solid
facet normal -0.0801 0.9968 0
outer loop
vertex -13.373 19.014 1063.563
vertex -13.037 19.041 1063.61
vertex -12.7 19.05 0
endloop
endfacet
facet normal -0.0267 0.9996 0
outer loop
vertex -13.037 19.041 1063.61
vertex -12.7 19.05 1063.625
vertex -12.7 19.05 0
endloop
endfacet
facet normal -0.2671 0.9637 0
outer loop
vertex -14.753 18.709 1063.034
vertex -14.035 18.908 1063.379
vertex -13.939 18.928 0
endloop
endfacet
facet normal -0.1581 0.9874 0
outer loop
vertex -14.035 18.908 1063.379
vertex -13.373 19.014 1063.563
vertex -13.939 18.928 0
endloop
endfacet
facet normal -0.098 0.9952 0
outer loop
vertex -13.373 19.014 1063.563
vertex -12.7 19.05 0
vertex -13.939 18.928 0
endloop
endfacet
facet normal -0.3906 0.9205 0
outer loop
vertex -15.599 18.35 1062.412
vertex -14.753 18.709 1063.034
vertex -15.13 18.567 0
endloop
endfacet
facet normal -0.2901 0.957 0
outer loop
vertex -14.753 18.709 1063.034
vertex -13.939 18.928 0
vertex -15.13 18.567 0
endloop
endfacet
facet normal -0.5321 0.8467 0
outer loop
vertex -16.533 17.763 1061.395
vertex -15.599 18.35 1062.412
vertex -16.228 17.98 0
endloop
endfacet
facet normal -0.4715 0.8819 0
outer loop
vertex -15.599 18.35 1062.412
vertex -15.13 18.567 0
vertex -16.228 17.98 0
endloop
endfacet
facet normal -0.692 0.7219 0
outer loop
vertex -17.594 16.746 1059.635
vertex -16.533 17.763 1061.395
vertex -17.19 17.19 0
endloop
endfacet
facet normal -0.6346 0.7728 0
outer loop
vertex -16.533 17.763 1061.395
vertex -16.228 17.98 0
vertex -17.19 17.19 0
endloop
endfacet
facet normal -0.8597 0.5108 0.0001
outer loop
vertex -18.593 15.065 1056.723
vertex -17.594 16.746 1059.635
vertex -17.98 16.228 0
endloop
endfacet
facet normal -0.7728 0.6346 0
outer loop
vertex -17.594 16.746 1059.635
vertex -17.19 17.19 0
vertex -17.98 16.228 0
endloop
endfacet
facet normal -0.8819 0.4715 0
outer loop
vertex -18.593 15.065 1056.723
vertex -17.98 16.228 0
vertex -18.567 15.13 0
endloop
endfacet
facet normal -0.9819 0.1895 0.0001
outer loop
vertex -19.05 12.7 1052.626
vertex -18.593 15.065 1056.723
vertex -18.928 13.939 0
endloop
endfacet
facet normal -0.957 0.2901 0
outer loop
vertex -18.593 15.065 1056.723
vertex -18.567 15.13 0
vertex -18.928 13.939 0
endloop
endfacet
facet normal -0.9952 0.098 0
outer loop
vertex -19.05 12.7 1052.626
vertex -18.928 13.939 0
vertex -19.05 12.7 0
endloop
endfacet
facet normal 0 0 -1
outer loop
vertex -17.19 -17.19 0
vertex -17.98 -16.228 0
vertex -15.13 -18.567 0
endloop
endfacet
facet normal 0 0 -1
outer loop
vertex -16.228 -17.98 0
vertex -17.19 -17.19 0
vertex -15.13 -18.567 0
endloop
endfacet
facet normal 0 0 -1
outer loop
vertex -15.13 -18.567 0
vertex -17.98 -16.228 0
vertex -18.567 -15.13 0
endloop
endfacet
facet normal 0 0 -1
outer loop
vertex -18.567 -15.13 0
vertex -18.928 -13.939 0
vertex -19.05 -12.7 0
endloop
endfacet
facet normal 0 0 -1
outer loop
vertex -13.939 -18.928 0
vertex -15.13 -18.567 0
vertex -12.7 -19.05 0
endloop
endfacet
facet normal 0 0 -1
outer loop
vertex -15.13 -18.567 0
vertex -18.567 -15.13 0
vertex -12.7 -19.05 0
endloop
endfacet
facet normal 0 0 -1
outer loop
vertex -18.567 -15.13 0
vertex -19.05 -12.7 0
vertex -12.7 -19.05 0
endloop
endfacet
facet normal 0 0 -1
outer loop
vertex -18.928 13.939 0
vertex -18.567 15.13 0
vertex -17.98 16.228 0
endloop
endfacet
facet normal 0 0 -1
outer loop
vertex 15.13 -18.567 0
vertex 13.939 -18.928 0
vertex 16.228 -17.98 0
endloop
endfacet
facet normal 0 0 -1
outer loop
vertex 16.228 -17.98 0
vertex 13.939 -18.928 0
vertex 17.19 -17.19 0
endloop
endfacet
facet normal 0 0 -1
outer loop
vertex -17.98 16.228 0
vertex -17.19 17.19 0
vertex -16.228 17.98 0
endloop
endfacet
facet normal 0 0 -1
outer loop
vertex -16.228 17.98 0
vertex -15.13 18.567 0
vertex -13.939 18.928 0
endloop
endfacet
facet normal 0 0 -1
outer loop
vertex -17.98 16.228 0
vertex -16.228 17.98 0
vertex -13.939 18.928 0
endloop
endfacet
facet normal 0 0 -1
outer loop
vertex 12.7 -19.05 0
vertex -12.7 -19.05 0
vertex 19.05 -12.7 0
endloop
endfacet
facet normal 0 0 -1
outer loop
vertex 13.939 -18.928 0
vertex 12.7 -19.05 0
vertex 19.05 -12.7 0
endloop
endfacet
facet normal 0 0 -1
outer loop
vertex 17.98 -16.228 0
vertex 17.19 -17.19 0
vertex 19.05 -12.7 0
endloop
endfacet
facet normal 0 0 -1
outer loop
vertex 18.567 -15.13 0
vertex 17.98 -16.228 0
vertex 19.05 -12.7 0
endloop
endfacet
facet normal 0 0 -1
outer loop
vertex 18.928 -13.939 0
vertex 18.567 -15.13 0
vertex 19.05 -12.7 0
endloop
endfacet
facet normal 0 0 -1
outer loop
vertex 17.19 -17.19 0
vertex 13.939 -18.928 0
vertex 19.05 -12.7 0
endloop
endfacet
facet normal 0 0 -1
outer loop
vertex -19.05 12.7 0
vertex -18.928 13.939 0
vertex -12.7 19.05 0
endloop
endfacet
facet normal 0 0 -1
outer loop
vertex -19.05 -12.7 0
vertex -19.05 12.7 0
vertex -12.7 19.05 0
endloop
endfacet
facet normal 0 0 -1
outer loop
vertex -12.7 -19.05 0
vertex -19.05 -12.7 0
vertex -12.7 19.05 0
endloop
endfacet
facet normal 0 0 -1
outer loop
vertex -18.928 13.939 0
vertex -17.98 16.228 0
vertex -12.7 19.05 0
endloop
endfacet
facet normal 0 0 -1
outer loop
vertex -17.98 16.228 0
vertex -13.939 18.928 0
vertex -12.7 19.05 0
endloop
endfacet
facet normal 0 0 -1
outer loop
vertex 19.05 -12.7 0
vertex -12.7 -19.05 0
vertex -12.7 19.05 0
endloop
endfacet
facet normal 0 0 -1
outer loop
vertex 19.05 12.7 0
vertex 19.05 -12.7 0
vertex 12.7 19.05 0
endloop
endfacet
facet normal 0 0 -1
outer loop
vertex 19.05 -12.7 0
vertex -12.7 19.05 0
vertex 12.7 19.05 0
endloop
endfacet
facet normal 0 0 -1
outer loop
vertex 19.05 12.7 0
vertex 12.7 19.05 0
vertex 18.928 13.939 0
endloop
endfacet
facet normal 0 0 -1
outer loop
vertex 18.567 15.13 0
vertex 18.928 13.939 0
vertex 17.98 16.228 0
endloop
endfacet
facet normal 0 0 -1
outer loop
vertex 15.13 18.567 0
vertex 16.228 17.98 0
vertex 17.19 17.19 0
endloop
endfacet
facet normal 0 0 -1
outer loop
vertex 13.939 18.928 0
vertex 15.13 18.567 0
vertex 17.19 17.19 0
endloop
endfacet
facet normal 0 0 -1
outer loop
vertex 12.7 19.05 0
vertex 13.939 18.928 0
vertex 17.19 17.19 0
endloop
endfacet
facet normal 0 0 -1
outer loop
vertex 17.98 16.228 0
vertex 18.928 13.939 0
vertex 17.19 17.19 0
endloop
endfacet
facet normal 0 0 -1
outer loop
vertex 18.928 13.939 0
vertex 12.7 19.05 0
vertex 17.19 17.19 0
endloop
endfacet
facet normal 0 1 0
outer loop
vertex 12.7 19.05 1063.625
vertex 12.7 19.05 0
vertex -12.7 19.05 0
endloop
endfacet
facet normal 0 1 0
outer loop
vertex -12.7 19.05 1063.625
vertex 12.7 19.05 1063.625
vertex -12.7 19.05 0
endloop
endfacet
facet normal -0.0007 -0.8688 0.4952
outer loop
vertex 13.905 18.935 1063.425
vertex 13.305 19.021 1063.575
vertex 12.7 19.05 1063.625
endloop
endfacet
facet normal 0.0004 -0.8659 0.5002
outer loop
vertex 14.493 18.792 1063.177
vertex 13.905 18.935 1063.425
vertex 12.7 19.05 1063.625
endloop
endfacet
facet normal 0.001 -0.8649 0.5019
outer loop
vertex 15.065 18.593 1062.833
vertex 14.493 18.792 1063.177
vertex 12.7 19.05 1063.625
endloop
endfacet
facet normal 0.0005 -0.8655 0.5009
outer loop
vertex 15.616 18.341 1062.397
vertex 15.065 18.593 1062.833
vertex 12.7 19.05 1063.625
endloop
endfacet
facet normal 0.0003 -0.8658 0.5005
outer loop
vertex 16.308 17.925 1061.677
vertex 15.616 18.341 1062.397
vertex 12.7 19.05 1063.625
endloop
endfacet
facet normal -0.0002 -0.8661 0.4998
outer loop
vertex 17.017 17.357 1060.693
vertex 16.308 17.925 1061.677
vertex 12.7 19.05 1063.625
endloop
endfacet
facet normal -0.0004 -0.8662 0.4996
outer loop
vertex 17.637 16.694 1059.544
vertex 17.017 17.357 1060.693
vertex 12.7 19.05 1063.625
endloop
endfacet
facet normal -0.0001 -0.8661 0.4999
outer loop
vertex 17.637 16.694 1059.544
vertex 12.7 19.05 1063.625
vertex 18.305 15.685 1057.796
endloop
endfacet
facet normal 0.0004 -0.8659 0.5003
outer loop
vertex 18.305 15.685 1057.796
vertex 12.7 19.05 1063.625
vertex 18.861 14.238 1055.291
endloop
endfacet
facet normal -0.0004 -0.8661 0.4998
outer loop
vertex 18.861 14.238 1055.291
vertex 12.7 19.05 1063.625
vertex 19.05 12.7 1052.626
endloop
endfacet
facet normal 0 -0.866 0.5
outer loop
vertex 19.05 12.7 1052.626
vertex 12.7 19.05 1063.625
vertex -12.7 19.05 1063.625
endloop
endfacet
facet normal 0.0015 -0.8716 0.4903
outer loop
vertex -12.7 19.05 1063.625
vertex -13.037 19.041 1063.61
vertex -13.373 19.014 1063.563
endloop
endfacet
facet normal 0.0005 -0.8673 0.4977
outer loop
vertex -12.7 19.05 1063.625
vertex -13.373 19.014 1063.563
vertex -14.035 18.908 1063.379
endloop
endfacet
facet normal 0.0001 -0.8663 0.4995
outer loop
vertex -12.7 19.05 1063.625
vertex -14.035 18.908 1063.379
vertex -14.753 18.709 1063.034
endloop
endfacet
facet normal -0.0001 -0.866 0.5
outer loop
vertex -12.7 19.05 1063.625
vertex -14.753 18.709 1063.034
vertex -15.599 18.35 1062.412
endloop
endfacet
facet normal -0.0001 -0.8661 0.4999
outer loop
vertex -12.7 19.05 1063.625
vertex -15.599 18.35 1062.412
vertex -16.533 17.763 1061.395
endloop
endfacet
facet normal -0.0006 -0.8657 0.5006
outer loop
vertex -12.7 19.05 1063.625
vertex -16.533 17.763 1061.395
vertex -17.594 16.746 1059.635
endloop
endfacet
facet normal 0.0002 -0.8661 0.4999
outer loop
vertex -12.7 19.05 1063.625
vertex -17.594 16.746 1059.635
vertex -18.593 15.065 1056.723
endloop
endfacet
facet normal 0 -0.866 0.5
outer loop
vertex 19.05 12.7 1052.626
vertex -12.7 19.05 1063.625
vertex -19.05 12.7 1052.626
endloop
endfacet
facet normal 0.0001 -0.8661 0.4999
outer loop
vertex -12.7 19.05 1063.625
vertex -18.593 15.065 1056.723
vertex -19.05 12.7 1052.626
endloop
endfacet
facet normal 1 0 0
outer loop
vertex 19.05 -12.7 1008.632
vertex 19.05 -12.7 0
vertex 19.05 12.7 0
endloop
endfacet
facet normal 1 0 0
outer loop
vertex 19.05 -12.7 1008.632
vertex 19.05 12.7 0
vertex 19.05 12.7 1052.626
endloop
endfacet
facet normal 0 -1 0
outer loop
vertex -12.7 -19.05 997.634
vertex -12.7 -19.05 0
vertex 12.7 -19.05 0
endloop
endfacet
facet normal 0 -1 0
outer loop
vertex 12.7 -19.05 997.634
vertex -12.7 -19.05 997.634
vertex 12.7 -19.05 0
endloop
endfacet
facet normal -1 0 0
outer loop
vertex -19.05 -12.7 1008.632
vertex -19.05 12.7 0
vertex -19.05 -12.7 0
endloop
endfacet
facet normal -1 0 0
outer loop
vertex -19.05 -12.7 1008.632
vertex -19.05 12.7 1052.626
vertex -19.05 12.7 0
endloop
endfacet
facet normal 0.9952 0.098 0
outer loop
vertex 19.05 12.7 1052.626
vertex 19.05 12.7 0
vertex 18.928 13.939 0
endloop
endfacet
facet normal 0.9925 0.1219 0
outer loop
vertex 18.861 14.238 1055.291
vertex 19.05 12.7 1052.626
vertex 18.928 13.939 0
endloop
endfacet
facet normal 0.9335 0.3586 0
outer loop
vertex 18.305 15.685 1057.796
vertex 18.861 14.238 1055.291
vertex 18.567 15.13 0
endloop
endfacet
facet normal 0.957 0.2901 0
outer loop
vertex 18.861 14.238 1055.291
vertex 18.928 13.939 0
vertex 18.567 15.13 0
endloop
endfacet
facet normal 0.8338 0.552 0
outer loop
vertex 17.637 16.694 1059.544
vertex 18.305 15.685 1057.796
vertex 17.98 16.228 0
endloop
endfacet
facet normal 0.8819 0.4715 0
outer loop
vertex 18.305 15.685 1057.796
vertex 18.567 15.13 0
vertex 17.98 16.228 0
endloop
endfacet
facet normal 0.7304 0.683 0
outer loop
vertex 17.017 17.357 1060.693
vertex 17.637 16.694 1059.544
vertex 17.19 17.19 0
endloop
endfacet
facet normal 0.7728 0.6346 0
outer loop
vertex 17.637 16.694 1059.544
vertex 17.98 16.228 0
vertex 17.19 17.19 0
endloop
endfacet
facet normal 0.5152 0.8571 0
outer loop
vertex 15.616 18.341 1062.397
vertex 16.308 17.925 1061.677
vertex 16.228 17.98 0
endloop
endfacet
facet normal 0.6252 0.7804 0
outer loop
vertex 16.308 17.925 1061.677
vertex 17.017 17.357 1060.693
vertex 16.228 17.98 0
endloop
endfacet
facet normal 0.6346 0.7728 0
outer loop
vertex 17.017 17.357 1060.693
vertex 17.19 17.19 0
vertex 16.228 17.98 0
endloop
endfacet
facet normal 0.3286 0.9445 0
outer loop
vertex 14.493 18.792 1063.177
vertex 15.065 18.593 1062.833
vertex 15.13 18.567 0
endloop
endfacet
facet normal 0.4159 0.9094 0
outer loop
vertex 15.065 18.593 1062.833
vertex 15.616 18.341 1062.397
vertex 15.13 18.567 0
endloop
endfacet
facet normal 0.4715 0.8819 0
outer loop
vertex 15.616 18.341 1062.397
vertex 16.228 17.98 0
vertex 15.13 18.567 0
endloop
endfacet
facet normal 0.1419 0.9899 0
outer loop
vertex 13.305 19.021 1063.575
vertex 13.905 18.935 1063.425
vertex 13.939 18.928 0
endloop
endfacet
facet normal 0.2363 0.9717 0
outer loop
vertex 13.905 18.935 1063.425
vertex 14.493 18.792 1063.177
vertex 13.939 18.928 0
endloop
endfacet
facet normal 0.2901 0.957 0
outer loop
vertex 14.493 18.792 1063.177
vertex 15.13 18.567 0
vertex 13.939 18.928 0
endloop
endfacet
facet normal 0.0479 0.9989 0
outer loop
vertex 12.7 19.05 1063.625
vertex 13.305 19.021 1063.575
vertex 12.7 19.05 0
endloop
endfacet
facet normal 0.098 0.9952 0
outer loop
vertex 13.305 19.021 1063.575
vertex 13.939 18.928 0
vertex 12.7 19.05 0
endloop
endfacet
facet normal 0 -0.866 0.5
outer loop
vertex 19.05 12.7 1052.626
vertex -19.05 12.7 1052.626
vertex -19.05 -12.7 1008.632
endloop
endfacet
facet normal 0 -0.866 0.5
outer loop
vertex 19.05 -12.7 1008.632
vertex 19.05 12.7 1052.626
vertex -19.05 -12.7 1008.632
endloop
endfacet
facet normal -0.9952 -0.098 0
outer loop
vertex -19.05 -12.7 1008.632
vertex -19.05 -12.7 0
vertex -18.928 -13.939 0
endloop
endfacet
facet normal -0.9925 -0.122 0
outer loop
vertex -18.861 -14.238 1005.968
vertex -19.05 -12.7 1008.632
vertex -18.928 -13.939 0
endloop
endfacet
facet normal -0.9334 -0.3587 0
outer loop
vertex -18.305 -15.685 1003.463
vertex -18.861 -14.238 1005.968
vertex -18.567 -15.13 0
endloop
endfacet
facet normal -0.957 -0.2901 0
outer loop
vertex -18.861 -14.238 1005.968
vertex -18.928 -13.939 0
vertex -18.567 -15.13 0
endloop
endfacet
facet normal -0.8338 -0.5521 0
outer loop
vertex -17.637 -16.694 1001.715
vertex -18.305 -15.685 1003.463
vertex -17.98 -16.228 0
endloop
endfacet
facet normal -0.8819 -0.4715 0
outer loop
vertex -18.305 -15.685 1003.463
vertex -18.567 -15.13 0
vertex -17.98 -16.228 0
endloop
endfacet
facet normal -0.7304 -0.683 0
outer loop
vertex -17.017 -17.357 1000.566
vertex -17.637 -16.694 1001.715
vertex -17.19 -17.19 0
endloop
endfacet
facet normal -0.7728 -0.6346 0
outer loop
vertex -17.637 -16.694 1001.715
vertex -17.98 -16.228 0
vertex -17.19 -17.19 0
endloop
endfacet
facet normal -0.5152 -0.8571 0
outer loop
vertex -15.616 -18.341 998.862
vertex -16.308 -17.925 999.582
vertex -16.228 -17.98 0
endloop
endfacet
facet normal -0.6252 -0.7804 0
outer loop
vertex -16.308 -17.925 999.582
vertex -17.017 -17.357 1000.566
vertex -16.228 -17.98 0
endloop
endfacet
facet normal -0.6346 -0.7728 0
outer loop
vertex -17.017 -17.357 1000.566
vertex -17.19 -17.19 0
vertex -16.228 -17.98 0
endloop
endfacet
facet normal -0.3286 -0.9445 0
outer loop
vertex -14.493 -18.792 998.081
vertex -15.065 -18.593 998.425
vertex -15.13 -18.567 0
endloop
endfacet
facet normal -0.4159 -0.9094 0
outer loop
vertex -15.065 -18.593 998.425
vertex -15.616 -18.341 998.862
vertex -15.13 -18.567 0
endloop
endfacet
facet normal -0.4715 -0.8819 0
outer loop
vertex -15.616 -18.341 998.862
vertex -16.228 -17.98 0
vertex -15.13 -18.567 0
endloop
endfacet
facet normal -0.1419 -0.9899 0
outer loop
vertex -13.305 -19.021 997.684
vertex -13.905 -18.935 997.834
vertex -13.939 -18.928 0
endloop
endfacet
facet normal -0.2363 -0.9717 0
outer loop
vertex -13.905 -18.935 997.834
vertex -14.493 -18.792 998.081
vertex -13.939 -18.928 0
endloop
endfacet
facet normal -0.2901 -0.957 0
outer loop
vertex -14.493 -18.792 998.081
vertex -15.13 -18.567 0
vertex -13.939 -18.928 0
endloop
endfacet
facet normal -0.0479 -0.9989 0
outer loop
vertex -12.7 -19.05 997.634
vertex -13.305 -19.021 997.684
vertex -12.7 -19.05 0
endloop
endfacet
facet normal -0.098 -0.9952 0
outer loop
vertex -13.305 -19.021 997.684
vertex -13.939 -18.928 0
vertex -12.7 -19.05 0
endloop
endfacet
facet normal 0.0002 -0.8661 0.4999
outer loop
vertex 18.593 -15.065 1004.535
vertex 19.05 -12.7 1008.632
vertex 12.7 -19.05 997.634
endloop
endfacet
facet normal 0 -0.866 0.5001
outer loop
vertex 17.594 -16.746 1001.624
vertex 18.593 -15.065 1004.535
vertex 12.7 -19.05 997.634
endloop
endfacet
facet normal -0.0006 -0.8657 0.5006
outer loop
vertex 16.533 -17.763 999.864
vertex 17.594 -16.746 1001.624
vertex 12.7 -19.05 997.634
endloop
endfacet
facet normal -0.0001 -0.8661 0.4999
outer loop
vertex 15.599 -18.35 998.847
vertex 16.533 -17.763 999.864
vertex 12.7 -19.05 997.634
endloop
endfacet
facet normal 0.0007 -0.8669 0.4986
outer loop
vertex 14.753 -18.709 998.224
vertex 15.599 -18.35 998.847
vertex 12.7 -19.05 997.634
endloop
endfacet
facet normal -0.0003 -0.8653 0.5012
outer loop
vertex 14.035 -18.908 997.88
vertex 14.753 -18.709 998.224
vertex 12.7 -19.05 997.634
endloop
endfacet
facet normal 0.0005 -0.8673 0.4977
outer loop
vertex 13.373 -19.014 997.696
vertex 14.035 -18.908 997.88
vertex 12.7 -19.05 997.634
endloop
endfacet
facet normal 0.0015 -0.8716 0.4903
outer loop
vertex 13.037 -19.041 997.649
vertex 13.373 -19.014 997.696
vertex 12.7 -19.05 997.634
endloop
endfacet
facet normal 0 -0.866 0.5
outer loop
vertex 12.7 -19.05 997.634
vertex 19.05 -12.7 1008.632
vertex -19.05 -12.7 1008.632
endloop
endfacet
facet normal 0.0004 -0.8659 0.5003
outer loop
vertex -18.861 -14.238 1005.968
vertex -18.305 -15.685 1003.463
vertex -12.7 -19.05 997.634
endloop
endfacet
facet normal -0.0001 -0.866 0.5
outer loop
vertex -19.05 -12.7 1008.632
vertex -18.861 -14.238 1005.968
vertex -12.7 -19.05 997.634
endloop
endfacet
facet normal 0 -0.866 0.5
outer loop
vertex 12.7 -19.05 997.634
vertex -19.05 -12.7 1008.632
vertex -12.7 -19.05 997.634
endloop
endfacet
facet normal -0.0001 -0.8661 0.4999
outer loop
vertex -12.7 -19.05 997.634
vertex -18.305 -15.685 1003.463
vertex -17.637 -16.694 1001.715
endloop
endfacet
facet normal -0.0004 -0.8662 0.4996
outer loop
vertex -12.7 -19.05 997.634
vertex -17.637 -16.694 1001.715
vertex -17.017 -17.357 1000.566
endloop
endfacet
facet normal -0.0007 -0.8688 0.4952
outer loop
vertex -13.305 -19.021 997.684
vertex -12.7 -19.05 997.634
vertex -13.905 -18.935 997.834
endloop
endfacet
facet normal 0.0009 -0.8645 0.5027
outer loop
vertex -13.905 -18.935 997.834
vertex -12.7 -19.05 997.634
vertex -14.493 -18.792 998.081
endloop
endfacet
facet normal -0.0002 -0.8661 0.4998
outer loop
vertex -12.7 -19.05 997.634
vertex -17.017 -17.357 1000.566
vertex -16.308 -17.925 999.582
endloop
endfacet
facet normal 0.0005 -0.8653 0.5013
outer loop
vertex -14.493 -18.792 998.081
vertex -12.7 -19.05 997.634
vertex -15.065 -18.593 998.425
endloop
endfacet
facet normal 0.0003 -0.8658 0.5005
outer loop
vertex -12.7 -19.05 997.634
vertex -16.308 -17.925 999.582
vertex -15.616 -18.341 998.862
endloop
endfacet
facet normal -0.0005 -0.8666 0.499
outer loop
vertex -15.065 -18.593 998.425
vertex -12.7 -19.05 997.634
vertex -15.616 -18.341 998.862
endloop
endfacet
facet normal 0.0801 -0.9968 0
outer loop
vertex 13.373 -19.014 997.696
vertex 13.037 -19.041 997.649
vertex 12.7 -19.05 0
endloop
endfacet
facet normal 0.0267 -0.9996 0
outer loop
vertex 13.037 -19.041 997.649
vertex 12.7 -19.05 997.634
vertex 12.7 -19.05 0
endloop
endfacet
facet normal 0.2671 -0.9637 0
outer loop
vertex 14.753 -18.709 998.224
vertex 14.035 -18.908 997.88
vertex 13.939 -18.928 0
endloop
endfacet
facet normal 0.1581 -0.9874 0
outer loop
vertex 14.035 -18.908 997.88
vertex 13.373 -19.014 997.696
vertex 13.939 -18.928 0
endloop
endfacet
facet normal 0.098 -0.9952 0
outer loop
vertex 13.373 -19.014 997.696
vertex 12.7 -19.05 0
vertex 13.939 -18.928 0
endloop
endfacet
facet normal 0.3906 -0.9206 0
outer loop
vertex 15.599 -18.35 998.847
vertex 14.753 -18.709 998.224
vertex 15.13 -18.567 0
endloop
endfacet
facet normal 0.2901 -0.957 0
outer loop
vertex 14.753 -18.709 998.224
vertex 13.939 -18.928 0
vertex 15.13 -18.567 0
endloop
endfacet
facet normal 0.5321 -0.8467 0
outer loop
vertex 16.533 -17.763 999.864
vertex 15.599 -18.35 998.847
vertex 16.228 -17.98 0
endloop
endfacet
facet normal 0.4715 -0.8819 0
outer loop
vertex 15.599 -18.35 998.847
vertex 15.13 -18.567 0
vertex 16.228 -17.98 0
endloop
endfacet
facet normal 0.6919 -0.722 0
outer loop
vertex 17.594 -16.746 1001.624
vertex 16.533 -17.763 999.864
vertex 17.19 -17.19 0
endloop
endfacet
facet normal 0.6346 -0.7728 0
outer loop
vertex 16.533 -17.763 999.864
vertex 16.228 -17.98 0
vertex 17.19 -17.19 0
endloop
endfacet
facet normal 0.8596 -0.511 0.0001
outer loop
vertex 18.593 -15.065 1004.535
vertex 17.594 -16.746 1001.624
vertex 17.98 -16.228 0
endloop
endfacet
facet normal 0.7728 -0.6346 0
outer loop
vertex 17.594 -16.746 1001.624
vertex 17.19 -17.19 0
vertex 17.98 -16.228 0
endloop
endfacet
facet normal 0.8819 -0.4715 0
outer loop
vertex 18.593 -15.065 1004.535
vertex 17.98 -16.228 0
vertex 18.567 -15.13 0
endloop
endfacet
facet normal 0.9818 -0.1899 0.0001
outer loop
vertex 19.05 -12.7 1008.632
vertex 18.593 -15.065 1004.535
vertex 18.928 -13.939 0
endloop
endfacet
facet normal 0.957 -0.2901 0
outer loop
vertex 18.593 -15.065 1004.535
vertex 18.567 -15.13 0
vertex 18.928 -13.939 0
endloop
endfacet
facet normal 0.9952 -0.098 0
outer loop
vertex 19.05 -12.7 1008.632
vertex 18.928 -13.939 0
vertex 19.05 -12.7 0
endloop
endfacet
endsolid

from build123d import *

# Parameters (mm, degrees)
F1_DEPTH = 1063.625
F3_DEPTH = 38.1


with BuildPart() as f1:
    # F0 (on Top) → F1 (new body)
    with BuildSketch(Plane.XY):
        with BuildLine():
            ThreePointArc((19.05, 12.7), (17.1901280605, 17.1901280605), (12.7, 19.05))
            Line((12.7, 19.05), (-12.7, 19.05))
            ThreePointArc((-12.7, 19.05), (-17.1901280605, 17.1901280605), (-19.05, 12.7))
            Line((-19.05, 12.7), (-19.05, -12.7))
            ThreePointArc((-19.05, -12.7), (-17.1901280605, -17.1901280605), (-12.7, -19.05))
            Line((-12.7, -19.05), (12.7, -19.05))
            ThreePointArc((12.7, -19.05), (17.1901280605, -17.1901280605), (19.05, -12.7))
            Line((19.05, -12.7), (19.05, 12.7))
        make_face()
    extrude(amount=F1_DEPTH)

    # F2 (on face) → F3 (cut)
    with BuildSketch(Plane(origin=(-19.05, 0, 0), x_dir=(0, -1, 0), z_dir=(-1, 0, 0))):
        Polygon((12.7, 1063.625), (12.7, 1008.6323868597), (19.05, 997.6338642316), (19.05, 1063.625), align=None)
        Polygon((-12.7, 1063.625), (-12.7, 1052.6264773719), (12.7, 1008.6323868597), (12.7, 1063.625), align=None)
        Polygon((-12.7, 1063.625), (-19.05, 1063.625), (-12.7, 1052.6264773719), align=None)
    extrude(amount=-F3_DEPTH, mode=Mode.SUBTRACT)


solid = f1.part
